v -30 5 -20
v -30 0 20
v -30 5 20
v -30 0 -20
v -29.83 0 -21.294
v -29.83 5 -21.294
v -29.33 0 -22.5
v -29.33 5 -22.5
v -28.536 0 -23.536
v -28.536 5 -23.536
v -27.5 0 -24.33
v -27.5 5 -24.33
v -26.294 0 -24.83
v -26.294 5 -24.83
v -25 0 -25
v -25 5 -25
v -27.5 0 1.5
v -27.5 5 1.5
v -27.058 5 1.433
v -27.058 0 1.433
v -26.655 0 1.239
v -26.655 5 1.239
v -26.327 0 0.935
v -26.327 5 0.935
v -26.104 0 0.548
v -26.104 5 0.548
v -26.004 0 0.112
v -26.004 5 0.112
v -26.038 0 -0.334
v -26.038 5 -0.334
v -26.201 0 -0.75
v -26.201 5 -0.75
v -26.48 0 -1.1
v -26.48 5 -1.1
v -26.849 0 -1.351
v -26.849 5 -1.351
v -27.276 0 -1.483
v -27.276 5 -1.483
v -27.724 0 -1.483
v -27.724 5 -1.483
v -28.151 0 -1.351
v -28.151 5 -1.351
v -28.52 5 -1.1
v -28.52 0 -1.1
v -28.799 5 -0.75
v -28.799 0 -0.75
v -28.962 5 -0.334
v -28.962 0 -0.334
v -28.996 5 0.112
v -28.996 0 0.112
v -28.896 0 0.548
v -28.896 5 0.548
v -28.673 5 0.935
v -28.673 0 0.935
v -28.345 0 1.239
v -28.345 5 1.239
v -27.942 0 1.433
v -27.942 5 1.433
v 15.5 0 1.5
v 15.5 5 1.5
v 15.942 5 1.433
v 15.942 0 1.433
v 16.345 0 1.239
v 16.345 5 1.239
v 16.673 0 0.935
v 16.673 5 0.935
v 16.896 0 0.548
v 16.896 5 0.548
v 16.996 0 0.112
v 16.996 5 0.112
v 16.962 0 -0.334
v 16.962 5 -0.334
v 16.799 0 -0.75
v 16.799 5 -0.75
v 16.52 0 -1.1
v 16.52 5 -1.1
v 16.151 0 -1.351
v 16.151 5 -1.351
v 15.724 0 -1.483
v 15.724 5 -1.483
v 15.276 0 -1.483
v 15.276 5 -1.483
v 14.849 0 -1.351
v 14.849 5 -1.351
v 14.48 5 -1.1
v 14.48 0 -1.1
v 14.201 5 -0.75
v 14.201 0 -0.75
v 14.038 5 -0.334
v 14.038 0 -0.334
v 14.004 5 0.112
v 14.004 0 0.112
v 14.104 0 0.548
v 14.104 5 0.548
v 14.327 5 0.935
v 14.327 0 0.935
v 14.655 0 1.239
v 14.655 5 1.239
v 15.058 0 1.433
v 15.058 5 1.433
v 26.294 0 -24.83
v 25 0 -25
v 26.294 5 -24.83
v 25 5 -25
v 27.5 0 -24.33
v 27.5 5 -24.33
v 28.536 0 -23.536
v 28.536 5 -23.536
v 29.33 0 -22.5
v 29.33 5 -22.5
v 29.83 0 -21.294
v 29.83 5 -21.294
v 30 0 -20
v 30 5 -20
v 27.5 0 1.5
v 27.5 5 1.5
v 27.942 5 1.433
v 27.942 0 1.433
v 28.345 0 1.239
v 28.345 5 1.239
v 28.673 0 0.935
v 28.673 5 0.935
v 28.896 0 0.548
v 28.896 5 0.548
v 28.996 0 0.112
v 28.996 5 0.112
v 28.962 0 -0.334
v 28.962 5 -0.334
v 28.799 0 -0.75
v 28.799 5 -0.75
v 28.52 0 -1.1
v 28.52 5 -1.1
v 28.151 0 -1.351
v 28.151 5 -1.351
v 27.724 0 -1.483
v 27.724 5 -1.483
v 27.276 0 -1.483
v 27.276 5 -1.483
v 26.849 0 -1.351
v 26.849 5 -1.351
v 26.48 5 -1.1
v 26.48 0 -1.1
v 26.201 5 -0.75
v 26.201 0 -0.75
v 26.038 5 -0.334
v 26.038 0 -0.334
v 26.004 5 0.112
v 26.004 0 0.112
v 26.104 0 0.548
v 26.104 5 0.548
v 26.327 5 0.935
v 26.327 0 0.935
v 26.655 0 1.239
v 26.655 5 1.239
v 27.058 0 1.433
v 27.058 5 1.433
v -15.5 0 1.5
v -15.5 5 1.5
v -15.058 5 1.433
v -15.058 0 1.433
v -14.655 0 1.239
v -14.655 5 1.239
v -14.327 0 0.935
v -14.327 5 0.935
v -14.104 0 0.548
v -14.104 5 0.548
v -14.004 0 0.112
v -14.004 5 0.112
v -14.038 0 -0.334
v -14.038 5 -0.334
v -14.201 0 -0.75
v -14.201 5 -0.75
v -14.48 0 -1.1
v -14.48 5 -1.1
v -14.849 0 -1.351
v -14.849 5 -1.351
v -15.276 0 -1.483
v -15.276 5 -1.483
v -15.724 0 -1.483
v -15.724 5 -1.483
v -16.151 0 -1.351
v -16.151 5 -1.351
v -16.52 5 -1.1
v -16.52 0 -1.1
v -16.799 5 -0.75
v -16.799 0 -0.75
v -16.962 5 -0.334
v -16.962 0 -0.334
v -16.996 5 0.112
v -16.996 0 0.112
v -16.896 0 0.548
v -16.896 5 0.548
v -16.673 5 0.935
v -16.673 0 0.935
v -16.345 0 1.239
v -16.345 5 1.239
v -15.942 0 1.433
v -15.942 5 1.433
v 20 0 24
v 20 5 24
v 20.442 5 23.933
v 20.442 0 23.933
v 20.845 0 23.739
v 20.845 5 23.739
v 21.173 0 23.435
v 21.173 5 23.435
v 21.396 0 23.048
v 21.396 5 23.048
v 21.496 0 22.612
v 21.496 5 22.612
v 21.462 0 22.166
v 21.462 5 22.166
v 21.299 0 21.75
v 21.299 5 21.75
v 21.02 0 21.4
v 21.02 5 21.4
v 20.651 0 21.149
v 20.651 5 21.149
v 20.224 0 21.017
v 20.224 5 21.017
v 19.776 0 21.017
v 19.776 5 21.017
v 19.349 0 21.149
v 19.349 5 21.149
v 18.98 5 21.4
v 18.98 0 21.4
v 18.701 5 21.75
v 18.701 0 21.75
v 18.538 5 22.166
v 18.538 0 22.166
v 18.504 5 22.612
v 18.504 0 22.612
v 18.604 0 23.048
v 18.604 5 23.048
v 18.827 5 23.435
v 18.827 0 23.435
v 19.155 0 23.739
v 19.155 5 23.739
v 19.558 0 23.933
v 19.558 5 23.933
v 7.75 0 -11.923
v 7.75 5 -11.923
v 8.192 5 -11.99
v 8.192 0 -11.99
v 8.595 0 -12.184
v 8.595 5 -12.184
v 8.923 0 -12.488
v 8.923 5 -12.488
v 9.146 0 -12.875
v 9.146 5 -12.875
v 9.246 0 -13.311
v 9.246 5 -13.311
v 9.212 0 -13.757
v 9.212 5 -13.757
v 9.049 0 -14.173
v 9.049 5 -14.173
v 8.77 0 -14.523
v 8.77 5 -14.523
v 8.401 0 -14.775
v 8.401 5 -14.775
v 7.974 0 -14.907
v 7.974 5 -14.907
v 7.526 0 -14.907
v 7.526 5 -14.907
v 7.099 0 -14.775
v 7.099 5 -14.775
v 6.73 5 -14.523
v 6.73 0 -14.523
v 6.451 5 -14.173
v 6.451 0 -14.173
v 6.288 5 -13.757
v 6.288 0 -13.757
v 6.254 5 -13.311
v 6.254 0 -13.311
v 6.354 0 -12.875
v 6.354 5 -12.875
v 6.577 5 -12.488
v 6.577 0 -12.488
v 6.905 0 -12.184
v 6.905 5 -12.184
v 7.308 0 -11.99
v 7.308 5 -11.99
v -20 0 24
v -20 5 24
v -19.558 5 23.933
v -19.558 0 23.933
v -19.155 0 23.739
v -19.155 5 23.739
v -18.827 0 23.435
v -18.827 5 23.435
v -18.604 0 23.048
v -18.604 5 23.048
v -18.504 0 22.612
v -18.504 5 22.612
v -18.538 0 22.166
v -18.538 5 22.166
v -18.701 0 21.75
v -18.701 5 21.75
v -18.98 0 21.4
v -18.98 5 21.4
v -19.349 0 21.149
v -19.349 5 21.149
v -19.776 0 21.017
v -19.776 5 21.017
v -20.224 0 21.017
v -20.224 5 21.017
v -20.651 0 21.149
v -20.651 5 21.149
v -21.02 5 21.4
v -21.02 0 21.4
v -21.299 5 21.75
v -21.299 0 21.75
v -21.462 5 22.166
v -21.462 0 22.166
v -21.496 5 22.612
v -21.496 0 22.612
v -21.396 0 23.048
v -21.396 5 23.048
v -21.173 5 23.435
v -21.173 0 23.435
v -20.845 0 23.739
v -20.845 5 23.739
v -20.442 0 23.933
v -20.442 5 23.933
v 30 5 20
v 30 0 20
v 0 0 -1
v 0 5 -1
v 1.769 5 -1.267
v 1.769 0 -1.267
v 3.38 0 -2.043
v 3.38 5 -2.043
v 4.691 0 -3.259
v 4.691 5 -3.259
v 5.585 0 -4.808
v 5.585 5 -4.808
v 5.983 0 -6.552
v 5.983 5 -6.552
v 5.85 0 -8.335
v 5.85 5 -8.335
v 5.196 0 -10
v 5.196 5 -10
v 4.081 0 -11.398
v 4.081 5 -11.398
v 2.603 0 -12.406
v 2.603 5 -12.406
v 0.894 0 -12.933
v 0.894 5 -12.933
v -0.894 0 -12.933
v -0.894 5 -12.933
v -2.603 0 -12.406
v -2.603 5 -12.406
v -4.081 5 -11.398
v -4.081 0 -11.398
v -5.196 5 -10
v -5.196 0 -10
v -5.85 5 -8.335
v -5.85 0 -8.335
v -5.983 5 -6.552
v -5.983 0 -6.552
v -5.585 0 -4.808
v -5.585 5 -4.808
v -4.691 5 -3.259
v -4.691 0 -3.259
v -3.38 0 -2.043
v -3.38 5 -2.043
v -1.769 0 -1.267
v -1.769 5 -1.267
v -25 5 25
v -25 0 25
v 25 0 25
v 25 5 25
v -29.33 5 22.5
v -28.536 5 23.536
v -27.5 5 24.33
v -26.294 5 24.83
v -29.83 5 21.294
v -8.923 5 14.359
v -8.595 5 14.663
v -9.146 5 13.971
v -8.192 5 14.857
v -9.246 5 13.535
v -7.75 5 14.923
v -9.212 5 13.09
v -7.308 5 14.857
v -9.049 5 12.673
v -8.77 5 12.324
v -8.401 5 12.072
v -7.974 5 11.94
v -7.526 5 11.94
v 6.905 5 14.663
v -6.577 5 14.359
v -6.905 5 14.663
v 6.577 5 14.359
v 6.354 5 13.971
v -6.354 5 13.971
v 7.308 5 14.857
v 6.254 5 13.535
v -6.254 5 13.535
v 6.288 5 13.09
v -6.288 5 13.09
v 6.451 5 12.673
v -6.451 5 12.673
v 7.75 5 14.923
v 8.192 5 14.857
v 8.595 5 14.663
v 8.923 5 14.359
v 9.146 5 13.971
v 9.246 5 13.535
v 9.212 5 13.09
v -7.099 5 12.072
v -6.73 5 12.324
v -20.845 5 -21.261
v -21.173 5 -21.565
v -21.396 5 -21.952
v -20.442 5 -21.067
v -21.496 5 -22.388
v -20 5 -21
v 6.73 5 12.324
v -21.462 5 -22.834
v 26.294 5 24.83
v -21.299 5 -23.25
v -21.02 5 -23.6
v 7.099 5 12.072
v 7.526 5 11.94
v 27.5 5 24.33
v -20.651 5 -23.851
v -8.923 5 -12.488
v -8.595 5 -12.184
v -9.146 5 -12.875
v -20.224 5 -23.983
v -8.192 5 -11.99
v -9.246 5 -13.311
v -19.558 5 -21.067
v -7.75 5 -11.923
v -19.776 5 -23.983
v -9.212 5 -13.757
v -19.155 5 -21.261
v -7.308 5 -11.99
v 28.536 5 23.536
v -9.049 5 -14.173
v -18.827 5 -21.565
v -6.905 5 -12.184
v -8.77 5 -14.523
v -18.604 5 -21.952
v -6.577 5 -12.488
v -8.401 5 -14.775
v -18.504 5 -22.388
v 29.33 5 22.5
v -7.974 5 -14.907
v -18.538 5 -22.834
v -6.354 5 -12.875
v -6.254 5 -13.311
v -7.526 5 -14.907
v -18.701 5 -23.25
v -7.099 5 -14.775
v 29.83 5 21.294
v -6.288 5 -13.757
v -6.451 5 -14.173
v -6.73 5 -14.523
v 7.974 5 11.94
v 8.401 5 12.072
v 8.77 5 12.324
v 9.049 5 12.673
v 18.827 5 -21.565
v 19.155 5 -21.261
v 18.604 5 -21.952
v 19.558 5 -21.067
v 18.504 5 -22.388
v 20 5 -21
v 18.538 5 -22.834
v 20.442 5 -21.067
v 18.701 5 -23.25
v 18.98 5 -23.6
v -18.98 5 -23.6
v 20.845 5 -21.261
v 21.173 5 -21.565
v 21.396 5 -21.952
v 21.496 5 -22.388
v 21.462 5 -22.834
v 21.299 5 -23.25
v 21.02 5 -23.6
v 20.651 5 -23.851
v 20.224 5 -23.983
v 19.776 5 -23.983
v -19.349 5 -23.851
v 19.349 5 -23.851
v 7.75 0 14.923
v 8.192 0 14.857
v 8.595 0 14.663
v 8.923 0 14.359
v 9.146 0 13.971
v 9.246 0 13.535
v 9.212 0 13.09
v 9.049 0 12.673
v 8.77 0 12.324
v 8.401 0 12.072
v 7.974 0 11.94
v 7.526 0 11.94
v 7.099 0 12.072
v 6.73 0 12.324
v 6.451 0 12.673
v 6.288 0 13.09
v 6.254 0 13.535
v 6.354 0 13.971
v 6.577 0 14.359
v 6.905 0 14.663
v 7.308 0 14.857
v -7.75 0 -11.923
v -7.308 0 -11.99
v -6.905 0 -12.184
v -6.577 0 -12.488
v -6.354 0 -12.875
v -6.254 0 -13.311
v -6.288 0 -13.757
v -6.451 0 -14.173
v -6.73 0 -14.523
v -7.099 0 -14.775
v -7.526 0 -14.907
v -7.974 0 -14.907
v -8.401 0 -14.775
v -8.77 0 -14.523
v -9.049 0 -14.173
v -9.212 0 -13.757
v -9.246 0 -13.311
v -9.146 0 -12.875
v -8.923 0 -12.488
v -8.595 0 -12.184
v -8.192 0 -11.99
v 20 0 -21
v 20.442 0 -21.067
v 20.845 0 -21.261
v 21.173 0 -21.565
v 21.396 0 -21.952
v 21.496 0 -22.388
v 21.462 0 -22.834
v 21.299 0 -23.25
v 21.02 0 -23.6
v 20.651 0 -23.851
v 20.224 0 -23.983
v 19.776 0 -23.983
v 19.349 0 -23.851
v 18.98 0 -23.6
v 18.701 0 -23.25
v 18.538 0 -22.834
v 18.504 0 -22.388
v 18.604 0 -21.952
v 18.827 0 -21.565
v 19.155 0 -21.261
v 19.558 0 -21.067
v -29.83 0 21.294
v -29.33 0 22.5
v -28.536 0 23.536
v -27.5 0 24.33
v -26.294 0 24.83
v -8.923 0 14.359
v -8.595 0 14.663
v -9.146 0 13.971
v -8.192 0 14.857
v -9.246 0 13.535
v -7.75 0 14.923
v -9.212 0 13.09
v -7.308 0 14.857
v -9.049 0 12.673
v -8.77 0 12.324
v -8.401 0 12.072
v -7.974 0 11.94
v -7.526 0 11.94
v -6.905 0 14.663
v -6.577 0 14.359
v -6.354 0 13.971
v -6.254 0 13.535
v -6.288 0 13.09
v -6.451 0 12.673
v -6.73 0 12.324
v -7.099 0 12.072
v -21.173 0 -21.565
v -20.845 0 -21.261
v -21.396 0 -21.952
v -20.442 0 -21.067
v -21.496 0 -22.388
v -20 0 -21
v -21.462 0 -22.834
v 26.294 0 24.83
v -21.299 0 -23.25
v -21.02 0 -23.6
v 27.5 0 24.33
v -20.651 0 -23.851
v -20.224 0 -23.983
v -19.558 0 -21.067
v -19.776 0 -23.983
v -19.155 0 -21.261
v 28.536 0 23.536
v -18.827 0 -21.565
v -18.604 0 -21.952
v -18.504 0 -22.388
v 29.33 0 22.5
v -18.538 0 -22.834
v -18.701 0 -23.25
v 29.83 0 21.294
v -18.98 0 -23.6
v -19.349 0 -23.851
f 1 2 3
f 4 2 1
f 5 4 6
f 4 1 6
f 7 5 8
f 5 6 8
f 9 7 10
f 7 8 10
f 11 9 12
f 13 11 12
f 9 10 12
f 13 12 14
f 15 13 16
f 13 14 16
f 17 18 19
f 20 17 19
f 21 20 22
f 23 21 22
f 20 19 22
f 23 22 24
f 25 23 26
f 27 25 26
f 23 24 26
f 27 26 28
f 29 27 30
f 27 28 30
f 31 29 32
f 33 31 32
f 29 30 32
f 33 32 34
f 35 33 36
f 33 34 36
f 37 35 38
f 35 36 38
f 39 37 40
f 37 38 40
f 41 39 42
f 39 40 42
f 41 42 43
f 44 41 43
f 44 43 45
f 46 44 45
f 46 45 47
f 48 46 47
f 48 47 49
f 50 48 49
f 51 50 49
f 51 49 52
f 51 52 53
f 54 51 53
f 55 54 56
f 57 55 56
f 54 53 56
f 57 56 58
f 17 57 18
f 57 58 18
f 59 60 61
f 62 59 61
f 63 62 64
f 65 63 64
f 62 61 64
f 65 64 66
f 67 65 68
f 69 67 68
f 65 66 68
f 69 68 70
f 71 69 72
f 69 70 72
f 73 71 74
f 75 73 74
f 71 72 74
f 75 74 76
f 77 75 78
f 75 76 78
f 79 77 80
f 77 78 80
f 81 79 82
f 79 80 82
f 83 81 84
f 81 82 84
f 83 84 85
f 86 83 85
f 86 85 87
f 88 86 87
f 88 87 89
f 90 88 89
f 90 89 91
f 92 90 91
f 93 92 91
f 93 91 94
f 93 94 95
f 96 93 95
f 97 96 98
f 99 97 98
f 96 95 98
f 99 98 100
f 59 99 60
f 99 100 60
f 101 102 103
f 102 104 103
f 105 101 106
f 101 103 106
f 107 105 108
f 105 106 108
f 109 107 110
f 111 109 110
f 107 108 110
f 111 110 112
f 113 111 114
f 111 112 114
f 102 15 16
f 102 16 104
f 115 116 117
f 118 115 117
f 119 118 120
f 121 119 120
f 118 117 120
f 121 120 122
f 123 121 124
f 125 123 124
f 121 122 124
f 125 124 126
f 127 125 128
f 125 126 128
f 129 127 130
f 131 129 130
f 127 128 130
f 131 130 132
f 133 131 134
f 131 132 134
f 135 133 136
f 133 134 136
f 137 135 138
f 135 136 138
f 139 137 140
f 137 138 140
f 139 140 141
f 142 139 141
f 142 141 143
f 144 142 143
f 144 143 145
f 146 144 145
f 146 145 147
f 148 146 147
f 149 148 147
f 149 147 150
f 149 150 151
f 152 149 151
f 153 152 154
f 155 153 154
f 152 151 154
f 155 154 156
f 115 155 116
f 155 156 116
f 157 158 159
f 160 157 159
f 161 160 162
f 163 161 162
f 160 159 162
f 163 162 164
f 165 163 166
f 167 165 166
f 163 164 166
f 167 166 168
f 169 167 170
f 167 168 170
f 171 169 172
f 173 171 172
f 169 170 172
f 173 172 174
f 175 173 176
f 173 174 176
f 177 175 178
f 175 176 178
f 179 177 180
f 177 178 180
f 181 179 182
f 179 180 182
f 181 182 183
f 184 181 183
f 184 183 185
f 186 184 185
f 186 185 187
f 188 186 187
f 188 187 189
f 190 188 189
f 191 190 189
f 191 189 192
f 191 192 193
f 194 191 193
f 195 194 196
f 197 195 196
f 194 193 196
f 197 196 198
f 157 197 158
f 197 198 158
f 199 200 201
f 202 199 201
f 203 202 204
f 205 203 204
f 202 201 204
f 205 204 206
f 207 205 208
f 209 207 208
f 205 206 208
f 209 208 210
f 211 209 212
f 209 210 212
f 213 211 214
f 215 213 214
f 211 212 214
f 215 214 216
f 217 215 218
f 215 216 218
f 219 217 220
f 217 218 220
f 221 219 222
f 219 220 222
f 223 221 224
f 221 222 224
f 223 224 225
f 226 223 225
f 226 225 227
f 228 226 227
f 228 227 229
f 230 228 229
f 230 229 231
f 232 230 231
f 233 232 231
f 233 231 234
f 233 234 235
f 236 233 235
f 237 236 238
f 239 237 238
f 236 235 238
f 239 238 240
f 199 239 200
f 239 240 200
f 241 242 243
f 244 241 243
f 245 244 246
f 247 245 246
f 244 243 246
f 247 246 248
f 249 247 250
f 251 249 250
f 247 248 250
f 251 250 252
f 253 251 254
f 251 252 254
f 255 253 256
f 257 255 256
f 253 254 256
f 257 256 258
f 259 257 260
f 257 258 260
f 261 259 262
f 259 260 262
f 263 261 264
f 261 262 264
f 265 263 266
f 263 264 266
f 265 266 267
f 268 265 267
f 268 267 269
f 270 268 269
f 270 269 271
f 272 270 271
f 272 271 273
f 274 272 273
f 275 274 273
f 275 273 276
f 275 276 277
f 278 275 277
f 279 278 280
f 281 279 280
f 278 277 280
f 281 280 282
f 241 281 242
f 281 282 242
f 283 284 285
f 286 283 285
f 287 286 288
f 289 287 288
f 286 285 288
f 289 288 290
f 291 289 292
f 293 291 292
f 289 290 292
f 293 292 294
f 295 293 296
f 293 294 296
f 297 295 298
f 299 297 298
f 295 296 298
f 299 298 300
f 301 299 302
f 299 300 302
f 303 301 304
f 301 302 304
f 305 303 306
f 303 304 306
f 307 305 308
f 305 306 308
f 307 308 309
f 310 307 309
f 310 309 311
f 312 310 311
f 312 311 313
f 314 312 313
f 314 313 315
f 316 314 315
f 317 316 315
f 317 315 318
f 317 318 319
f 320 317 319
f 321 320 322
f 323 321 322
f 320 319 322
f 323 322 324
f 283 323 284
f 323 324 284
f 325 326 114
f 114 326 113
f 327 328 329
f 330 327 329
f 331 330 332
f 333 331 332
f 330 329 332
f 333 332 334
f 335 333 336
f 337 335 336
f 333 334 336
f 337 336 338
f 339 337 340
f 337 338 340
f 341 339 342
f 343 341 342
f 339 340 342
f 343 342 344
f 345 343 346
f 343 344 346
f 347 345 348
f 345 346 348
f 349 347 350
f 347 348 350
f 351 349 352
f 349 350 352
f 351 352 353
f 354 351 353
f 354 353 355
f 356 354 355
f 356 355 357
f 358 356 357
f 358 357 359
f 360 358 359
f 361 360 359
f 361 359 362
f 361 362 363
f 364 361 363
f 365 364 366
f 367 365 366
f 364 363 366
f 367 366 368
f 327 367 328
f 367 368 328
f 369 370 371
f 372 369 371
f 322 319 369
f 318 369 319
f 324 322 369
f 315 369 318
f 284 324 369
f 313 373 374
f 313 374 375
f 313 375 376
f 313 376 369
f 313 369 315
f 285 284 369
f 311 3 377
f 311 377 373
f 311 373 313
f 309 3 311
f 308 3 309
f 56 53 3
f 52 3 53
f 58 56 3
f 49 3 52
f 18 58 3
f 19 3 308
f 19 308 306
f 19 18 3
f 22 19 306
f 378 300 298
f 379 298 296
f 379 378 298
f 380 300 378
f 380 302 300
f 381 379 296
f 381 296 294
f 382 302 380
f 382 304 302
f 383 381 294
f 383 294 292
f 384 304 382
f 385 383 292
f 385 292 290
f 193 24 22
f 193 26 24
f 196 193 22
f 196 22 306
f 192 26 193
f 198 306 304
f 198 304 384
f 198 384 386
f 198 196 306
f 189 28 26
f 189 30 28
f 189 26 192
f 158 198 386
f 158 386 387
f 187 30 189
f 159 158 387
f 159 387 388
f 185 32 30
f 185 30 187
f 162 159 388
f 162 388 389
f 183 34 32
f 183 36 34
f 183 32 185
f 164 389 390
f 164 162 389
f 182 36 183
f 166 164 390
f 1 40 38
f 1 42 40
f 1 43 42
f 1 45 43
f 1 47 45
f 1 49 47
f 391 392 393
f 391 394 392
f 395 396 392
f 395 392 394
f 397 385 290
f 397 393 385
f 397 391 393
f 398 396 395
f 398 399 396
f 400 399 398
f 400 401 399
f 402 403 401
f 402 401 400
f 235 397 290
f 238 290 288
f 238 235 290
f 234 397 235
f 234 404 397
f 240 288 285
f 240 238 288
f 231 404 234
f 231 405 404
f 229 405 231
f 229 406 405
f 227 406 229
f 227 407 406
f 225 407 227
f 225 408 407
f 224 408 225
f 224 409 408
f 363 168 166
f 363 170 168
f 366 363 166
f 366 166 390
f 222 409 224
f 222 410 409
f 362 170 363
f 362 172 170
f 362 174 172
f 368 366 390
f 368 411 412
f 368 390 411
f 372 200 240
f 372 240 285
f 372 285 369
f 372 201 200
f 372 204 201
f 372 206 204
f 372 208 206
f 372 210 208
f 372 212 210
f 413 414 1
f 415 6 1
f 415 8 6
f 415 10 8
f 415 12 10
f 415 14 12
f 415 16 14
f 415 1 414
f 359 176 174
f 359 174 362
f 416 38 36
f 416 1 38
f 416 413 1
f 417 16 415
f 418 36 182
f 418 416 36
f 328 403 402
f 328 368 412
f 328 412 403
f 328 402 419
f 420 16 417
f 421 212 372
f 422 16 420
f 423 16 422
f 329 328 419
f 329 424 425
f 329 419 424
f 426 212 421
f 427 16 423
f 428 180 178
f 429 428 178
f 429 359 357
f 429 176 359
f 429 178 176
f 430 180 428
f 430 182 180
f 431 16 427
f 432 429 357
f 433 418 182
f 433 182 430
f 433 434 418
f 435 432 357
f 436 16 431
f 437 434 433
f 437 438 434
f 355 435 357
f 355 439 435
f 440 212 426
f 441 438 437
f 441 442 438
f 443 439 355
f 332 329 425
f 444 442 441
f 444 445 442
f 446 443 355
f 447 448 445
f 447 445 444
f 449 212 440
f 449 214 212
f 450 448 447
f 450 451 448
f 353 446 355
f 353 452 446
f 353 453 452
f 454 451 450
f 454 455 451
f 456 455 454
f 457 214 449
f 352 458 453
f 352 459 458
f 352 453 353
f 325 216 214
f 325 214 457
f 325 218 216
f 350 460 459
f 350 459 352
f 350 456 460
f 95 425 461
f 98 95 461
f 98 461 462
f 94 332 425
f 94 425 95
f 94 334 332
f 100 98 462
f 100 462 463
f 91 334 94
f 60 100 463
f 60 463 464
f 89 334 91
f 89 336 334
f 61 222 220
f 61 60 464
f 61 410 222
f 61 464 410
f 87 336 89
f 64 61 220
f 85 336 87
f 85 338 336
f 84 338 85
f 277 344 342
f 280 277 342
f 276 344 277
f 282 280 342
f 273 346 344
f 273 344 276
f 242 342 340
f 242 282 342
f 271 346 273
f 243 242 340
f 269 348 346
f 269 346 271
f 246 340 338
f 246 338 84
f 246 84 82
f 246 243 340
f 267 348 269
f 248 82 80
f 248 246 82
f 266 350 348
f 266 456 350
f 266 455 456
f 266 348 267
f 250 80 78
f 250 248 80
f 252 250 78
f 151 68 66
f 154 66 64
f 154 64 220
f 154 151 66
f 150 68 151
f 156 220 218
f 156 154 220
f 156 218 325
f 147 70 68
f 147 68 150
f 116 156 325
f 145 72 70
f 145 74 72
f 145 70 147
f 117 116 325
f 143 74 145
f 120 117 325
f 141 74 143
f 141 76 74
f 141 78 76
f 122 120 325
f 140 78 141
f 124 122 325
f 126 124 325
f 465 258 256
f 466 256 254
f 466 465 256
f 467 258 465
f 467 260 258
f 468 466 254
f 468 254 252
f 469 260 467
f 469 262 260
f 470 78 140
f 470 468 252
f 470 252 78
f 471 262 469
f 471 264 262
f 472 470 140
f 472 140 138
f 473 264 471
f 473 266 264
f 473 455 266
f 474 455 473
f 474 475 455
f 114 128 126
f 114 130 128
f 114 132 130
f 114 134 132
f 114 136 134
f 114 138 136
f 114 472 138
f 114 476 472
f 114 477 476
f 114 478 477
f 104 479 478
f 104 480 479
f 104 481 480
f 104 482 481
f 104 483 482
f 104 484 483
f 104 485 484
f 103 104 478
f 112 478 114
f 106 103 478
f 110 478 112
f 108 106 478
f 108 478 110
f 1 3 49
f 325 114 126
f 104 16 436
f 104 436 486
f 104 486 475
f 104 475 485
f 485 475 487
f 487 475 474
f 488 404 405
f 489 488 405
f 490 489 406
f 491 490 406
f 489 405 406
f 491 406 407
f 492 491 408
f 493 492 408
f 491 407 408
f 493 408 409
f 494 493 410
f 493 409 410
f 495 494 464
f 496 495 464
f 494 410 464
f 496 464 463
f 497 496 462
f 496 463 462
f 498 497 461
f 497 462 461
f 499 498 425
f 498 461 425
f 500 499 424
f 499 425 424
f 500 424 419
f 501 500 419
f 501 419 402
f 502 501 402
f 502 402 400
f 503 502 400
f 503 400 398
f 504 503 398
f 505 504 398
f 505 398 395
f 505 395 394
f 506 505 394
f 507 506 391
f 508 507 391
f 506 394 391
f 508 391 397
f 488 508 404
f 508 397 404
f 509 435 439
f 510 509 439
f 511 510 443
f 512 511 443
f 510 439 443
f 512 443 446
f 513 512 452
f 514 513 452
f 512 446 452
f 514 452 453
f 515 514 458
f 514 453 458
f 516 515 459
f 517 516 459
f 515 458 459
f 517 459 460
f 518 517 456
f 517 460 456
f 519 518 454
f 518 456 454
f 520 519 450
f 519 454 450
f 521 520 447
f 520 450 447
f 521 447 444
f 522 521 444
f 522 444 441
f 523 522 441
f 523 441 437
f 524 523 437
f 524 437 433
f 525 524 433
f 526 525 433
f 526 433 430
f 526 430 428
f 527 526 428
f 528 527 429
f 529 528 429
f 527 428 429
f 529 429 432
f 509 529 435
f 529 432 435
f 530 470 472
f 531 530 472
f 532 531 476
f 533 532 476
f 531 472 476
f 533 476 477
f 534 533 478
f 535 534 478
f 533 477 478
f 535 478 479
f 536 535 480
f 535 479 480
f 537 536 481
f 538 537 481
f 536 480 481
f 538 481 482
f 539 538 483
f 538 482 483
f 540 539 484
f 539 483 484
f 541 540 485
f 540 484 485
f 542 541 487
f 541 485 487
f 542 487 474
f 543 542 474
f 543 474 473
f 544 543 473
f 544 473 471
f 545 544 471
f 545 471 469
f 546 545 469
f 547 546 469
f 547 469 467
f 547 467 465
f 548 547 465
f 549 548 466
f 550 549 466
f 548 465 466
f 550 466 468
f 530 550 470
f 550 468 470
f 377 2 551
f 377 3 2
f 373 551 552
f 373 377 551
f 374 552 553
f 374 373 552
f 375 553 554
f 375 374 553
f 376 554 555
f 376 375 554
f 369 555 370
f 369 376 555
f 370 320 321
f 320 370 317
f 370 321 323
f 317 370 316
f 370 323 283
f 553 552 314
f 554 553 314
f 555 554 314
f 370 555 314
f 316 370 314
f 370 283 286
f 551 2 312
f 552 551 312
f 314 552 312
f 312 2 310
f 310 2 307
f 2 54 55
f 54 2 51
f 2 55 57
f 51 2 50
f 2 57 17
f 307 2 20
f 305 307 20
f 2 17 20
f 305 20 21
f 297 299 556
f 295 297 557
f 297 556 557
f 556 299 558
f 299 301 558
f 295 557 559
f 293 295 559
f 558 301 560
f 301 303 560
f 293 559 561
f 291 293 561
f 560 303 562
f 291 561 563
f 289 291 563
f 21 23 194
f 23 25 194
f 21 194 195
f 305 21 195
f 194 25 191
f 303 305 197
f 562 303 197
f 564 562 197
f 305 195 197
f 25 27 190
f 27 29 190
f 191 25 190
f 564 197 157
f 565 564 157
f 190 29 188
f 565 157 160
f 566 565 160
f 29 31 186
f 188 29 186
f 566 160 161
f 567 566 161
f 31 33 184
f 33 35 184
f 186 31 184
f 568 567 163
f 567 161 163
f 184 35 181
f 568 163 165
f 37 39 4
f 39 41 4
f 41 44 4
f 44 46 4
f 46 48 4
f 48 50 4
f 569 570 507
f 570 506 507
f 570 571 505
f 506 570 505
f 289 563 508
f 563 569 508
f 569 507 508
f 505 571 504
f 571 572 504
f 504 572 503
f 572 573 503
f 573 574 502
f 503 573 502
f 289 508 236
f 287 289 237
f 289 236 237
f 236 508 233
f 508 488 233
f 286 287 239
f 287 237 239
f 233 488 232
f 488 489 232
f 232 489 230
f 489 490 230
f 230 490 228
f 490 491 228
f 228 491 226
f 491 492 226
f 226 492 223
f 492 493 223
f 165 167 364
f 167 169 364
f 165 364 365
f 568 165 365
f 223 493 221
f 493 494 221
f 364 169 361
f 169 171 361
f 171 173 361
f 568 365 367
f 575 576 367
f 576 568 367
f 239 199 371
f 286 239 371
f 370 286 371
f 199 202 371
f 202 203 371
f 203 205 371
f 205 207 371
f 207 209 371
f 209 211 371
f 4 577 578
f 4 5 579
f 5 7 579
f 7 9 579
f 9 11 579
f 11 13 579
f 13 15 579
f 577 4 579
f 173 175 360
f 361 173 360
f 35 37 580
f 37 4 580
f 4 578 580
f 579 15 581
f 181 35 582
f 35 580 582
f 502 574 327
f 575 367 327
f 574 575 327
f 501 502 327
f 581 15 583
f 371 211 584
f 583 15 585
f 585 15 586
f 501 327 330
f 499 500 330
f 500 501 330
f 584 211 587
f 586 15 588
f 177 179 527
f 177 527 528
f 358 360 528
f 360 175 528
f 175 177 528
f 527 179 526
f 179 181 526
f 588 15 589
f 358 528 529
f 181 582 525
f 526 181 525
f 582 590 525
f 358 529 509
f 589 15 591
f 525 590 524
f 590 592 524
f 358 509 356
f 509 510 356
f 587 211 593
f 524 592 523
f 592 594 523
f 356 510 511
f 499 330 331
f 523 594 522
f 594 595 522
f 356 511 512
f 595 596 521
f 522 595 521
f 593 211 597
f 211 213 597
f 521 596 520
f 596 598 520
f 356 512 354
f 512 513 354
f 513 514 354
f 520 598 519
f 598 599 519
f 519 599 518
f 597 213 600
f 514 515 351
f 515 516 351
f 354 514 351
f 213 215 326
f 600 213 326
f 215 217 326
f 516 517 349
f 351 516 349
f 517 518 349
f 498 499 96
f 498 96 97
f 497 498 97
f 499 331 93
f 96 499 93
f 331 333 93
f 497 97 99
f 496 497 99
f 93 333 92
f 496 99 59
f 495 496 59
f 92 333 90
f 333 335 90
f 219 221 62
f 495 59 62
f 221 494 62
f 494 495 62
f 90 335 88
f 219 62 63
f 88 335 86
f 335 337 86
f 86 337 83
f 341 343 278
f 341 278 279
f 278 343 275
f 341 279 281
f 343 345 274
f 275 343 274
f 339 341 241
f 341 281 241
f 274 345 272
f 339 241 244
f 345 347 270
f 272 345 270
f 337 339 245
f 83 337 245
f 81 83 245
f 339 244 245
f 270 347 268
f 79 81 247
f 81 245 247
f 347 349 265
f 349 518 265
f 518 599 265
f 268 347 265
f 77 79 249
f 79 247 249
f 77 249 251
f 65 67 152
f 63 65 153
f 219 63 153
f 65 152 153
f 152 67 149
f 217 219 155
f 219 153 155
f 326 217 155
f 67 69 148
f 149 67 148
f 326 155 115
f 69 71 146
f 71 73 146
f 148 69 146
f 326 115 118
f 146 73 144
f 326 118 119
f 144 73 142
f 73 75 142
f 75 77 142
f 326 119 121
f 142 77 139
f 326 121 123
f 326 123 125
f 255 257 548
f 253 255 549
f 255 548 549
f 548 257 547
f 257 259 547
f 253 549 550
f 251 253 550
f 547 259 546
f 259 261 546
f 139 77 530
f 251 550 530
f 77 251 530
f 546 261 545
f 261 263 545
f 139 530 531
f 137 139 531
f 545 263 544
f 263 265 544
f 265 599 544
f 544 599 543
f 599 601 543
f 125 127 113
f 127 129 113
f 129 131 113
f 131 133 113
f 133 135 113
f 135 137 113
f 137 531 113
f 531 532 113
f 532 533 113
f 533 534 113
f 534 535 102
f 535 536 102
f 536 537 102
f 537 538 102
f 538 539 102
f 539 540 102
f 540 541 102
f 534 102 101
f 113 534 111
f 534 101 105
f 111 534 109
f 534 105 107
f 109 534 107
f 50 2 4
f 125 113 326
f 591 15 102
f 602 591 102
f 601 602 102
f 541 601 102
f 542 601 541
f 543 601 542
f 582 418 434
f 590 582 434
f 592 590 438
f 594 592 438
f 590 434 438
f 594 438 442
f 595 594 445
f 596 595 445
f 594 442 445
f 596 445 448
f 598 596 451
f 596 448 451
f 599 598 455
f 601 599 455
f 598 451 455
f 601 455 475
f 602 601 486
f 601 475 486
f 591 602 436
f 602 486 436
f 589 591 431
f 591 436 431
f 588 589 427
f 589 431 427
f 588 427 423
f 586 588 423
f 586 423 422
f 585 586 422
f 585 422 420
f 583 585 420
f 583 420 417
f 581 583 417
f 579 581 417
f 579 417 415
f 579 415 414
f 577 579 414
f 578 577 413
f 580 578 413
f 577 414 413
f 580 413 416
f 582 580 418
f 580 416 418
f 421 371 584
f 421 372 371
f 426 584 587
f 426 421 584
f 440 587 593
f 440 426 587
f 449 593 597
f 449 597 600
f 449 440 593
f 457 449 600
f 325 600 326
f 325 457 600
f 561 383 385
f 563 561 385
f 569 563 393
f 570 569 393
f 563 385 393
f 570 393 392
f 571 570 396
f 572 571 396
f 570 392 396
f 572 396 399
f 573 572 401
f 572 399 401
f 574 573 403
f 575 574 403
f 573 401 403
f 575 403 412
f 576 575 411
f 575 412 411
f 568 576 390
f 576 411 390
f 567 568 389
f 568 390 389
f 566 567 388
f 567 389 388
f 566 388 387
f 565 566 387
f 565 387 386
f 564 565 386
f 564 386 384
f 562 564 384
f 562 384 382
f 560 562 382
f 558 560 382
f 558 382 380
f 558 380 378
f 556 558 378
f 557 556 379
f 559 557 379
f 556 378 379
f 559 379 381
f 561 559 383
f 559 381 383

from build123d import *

# Parameters (mm, degrees)
SKETCH1_W           = 60
SKETCH1_H           = 50
BOSS_EXTRUDE1_DEPTH = 5
SKETCH2_R           = 6
SKETCH2_R_2         = 1.5
CUT_EXTRUDE1_DEPTH  = 5
FILLET1_R           = 5


with BuildPart() as part:
    # Sketch1 → Boss-Extrude1 (new body)
    with BuildSketch(Plane(origin=(0, 0, 0), x_dir=(1, 0, 0), z_dir=(0, 1, 0))):
        Rectangle(SKETCH1_W, SKETCH1_H)
    extrude(amount=BOSS_EXTRUDE1_DEPTH)

    # Sketch2 → Cut-Extrude1 (cut)
    with BuildSketch(Plane(origin=(0, 5, 0), x_dir=(1, 0, 0), z_dir=(0, 1, 0))):
        with Locations(Location((0, 7, 0), (0, 0, 270))):
            Circle(SKETCH2_R)
        with Locations(Location((-7.75, 13.423393759, 0), (0, 0, 270))):
            Circle(SKETCH2_R_2)
        with Locations(Location((-15.5, 0, 0), (0, 0, 270))):
            Circle(SKETCH2_R_2)
        with Locations(Location((-7.75, -13.423393759, 0), (0, 0, 270))):
            Circle(SKETCH2_R_2)
        with Locations(Location((7.75, -13.423393759, 0), (0, 0, 270))):
            Circle(SKETCH2_R_2)
        with Locations(Location((15.5, 0, 0), (0, 0, 270))):
            Circle(SKETCH2_R_2)
        with Locations(Location((7.75, 13.423393759, 0), (0, 0, 270))):
            Circle(SKETCH2_R_2)
        with Locations(Location((-20, 22.5, 0), (0, 0, 270))):
            Circle(SKETCH2_R_2)
        with Locations(Location((20, 22.5, 0), (0, 0, 270))):
            Circle(SKETCH2_R_2)
        with Locations(Location((20, -22.5, 0), (0, 0, 270))):
            Circle(SKETCH2_R_2)
        with Locations(Location((-20, -22.5, 0), (0, 0, 270))):
            Circle(SKETCH2_R_2)
        with Locations(Location((-27.5, 0, 0), (0, 0, 270))):
            Circle(SKETCH2_R_2)
        with Locations(Location((27.5, 0, 0), (0, 0, 270))):
            Circle(SKETCH2_R_2)
    extrude(amount=-CUT_EXTRUDE1_DEPTH, mode=Mode.SUBTRACT)

    # Fillet1
    fillet1_edges = [part.edges().sort_by_distance(p)[0] for p in [
        (30, 2.5, 25),
        (-30, 2.5, 25),
        (-30, 2.5, -25),
        (30, 2.5, -25),
    ]]
    fillet(fillet1_edges, radius=FILLET1_R)


solid = part.part
